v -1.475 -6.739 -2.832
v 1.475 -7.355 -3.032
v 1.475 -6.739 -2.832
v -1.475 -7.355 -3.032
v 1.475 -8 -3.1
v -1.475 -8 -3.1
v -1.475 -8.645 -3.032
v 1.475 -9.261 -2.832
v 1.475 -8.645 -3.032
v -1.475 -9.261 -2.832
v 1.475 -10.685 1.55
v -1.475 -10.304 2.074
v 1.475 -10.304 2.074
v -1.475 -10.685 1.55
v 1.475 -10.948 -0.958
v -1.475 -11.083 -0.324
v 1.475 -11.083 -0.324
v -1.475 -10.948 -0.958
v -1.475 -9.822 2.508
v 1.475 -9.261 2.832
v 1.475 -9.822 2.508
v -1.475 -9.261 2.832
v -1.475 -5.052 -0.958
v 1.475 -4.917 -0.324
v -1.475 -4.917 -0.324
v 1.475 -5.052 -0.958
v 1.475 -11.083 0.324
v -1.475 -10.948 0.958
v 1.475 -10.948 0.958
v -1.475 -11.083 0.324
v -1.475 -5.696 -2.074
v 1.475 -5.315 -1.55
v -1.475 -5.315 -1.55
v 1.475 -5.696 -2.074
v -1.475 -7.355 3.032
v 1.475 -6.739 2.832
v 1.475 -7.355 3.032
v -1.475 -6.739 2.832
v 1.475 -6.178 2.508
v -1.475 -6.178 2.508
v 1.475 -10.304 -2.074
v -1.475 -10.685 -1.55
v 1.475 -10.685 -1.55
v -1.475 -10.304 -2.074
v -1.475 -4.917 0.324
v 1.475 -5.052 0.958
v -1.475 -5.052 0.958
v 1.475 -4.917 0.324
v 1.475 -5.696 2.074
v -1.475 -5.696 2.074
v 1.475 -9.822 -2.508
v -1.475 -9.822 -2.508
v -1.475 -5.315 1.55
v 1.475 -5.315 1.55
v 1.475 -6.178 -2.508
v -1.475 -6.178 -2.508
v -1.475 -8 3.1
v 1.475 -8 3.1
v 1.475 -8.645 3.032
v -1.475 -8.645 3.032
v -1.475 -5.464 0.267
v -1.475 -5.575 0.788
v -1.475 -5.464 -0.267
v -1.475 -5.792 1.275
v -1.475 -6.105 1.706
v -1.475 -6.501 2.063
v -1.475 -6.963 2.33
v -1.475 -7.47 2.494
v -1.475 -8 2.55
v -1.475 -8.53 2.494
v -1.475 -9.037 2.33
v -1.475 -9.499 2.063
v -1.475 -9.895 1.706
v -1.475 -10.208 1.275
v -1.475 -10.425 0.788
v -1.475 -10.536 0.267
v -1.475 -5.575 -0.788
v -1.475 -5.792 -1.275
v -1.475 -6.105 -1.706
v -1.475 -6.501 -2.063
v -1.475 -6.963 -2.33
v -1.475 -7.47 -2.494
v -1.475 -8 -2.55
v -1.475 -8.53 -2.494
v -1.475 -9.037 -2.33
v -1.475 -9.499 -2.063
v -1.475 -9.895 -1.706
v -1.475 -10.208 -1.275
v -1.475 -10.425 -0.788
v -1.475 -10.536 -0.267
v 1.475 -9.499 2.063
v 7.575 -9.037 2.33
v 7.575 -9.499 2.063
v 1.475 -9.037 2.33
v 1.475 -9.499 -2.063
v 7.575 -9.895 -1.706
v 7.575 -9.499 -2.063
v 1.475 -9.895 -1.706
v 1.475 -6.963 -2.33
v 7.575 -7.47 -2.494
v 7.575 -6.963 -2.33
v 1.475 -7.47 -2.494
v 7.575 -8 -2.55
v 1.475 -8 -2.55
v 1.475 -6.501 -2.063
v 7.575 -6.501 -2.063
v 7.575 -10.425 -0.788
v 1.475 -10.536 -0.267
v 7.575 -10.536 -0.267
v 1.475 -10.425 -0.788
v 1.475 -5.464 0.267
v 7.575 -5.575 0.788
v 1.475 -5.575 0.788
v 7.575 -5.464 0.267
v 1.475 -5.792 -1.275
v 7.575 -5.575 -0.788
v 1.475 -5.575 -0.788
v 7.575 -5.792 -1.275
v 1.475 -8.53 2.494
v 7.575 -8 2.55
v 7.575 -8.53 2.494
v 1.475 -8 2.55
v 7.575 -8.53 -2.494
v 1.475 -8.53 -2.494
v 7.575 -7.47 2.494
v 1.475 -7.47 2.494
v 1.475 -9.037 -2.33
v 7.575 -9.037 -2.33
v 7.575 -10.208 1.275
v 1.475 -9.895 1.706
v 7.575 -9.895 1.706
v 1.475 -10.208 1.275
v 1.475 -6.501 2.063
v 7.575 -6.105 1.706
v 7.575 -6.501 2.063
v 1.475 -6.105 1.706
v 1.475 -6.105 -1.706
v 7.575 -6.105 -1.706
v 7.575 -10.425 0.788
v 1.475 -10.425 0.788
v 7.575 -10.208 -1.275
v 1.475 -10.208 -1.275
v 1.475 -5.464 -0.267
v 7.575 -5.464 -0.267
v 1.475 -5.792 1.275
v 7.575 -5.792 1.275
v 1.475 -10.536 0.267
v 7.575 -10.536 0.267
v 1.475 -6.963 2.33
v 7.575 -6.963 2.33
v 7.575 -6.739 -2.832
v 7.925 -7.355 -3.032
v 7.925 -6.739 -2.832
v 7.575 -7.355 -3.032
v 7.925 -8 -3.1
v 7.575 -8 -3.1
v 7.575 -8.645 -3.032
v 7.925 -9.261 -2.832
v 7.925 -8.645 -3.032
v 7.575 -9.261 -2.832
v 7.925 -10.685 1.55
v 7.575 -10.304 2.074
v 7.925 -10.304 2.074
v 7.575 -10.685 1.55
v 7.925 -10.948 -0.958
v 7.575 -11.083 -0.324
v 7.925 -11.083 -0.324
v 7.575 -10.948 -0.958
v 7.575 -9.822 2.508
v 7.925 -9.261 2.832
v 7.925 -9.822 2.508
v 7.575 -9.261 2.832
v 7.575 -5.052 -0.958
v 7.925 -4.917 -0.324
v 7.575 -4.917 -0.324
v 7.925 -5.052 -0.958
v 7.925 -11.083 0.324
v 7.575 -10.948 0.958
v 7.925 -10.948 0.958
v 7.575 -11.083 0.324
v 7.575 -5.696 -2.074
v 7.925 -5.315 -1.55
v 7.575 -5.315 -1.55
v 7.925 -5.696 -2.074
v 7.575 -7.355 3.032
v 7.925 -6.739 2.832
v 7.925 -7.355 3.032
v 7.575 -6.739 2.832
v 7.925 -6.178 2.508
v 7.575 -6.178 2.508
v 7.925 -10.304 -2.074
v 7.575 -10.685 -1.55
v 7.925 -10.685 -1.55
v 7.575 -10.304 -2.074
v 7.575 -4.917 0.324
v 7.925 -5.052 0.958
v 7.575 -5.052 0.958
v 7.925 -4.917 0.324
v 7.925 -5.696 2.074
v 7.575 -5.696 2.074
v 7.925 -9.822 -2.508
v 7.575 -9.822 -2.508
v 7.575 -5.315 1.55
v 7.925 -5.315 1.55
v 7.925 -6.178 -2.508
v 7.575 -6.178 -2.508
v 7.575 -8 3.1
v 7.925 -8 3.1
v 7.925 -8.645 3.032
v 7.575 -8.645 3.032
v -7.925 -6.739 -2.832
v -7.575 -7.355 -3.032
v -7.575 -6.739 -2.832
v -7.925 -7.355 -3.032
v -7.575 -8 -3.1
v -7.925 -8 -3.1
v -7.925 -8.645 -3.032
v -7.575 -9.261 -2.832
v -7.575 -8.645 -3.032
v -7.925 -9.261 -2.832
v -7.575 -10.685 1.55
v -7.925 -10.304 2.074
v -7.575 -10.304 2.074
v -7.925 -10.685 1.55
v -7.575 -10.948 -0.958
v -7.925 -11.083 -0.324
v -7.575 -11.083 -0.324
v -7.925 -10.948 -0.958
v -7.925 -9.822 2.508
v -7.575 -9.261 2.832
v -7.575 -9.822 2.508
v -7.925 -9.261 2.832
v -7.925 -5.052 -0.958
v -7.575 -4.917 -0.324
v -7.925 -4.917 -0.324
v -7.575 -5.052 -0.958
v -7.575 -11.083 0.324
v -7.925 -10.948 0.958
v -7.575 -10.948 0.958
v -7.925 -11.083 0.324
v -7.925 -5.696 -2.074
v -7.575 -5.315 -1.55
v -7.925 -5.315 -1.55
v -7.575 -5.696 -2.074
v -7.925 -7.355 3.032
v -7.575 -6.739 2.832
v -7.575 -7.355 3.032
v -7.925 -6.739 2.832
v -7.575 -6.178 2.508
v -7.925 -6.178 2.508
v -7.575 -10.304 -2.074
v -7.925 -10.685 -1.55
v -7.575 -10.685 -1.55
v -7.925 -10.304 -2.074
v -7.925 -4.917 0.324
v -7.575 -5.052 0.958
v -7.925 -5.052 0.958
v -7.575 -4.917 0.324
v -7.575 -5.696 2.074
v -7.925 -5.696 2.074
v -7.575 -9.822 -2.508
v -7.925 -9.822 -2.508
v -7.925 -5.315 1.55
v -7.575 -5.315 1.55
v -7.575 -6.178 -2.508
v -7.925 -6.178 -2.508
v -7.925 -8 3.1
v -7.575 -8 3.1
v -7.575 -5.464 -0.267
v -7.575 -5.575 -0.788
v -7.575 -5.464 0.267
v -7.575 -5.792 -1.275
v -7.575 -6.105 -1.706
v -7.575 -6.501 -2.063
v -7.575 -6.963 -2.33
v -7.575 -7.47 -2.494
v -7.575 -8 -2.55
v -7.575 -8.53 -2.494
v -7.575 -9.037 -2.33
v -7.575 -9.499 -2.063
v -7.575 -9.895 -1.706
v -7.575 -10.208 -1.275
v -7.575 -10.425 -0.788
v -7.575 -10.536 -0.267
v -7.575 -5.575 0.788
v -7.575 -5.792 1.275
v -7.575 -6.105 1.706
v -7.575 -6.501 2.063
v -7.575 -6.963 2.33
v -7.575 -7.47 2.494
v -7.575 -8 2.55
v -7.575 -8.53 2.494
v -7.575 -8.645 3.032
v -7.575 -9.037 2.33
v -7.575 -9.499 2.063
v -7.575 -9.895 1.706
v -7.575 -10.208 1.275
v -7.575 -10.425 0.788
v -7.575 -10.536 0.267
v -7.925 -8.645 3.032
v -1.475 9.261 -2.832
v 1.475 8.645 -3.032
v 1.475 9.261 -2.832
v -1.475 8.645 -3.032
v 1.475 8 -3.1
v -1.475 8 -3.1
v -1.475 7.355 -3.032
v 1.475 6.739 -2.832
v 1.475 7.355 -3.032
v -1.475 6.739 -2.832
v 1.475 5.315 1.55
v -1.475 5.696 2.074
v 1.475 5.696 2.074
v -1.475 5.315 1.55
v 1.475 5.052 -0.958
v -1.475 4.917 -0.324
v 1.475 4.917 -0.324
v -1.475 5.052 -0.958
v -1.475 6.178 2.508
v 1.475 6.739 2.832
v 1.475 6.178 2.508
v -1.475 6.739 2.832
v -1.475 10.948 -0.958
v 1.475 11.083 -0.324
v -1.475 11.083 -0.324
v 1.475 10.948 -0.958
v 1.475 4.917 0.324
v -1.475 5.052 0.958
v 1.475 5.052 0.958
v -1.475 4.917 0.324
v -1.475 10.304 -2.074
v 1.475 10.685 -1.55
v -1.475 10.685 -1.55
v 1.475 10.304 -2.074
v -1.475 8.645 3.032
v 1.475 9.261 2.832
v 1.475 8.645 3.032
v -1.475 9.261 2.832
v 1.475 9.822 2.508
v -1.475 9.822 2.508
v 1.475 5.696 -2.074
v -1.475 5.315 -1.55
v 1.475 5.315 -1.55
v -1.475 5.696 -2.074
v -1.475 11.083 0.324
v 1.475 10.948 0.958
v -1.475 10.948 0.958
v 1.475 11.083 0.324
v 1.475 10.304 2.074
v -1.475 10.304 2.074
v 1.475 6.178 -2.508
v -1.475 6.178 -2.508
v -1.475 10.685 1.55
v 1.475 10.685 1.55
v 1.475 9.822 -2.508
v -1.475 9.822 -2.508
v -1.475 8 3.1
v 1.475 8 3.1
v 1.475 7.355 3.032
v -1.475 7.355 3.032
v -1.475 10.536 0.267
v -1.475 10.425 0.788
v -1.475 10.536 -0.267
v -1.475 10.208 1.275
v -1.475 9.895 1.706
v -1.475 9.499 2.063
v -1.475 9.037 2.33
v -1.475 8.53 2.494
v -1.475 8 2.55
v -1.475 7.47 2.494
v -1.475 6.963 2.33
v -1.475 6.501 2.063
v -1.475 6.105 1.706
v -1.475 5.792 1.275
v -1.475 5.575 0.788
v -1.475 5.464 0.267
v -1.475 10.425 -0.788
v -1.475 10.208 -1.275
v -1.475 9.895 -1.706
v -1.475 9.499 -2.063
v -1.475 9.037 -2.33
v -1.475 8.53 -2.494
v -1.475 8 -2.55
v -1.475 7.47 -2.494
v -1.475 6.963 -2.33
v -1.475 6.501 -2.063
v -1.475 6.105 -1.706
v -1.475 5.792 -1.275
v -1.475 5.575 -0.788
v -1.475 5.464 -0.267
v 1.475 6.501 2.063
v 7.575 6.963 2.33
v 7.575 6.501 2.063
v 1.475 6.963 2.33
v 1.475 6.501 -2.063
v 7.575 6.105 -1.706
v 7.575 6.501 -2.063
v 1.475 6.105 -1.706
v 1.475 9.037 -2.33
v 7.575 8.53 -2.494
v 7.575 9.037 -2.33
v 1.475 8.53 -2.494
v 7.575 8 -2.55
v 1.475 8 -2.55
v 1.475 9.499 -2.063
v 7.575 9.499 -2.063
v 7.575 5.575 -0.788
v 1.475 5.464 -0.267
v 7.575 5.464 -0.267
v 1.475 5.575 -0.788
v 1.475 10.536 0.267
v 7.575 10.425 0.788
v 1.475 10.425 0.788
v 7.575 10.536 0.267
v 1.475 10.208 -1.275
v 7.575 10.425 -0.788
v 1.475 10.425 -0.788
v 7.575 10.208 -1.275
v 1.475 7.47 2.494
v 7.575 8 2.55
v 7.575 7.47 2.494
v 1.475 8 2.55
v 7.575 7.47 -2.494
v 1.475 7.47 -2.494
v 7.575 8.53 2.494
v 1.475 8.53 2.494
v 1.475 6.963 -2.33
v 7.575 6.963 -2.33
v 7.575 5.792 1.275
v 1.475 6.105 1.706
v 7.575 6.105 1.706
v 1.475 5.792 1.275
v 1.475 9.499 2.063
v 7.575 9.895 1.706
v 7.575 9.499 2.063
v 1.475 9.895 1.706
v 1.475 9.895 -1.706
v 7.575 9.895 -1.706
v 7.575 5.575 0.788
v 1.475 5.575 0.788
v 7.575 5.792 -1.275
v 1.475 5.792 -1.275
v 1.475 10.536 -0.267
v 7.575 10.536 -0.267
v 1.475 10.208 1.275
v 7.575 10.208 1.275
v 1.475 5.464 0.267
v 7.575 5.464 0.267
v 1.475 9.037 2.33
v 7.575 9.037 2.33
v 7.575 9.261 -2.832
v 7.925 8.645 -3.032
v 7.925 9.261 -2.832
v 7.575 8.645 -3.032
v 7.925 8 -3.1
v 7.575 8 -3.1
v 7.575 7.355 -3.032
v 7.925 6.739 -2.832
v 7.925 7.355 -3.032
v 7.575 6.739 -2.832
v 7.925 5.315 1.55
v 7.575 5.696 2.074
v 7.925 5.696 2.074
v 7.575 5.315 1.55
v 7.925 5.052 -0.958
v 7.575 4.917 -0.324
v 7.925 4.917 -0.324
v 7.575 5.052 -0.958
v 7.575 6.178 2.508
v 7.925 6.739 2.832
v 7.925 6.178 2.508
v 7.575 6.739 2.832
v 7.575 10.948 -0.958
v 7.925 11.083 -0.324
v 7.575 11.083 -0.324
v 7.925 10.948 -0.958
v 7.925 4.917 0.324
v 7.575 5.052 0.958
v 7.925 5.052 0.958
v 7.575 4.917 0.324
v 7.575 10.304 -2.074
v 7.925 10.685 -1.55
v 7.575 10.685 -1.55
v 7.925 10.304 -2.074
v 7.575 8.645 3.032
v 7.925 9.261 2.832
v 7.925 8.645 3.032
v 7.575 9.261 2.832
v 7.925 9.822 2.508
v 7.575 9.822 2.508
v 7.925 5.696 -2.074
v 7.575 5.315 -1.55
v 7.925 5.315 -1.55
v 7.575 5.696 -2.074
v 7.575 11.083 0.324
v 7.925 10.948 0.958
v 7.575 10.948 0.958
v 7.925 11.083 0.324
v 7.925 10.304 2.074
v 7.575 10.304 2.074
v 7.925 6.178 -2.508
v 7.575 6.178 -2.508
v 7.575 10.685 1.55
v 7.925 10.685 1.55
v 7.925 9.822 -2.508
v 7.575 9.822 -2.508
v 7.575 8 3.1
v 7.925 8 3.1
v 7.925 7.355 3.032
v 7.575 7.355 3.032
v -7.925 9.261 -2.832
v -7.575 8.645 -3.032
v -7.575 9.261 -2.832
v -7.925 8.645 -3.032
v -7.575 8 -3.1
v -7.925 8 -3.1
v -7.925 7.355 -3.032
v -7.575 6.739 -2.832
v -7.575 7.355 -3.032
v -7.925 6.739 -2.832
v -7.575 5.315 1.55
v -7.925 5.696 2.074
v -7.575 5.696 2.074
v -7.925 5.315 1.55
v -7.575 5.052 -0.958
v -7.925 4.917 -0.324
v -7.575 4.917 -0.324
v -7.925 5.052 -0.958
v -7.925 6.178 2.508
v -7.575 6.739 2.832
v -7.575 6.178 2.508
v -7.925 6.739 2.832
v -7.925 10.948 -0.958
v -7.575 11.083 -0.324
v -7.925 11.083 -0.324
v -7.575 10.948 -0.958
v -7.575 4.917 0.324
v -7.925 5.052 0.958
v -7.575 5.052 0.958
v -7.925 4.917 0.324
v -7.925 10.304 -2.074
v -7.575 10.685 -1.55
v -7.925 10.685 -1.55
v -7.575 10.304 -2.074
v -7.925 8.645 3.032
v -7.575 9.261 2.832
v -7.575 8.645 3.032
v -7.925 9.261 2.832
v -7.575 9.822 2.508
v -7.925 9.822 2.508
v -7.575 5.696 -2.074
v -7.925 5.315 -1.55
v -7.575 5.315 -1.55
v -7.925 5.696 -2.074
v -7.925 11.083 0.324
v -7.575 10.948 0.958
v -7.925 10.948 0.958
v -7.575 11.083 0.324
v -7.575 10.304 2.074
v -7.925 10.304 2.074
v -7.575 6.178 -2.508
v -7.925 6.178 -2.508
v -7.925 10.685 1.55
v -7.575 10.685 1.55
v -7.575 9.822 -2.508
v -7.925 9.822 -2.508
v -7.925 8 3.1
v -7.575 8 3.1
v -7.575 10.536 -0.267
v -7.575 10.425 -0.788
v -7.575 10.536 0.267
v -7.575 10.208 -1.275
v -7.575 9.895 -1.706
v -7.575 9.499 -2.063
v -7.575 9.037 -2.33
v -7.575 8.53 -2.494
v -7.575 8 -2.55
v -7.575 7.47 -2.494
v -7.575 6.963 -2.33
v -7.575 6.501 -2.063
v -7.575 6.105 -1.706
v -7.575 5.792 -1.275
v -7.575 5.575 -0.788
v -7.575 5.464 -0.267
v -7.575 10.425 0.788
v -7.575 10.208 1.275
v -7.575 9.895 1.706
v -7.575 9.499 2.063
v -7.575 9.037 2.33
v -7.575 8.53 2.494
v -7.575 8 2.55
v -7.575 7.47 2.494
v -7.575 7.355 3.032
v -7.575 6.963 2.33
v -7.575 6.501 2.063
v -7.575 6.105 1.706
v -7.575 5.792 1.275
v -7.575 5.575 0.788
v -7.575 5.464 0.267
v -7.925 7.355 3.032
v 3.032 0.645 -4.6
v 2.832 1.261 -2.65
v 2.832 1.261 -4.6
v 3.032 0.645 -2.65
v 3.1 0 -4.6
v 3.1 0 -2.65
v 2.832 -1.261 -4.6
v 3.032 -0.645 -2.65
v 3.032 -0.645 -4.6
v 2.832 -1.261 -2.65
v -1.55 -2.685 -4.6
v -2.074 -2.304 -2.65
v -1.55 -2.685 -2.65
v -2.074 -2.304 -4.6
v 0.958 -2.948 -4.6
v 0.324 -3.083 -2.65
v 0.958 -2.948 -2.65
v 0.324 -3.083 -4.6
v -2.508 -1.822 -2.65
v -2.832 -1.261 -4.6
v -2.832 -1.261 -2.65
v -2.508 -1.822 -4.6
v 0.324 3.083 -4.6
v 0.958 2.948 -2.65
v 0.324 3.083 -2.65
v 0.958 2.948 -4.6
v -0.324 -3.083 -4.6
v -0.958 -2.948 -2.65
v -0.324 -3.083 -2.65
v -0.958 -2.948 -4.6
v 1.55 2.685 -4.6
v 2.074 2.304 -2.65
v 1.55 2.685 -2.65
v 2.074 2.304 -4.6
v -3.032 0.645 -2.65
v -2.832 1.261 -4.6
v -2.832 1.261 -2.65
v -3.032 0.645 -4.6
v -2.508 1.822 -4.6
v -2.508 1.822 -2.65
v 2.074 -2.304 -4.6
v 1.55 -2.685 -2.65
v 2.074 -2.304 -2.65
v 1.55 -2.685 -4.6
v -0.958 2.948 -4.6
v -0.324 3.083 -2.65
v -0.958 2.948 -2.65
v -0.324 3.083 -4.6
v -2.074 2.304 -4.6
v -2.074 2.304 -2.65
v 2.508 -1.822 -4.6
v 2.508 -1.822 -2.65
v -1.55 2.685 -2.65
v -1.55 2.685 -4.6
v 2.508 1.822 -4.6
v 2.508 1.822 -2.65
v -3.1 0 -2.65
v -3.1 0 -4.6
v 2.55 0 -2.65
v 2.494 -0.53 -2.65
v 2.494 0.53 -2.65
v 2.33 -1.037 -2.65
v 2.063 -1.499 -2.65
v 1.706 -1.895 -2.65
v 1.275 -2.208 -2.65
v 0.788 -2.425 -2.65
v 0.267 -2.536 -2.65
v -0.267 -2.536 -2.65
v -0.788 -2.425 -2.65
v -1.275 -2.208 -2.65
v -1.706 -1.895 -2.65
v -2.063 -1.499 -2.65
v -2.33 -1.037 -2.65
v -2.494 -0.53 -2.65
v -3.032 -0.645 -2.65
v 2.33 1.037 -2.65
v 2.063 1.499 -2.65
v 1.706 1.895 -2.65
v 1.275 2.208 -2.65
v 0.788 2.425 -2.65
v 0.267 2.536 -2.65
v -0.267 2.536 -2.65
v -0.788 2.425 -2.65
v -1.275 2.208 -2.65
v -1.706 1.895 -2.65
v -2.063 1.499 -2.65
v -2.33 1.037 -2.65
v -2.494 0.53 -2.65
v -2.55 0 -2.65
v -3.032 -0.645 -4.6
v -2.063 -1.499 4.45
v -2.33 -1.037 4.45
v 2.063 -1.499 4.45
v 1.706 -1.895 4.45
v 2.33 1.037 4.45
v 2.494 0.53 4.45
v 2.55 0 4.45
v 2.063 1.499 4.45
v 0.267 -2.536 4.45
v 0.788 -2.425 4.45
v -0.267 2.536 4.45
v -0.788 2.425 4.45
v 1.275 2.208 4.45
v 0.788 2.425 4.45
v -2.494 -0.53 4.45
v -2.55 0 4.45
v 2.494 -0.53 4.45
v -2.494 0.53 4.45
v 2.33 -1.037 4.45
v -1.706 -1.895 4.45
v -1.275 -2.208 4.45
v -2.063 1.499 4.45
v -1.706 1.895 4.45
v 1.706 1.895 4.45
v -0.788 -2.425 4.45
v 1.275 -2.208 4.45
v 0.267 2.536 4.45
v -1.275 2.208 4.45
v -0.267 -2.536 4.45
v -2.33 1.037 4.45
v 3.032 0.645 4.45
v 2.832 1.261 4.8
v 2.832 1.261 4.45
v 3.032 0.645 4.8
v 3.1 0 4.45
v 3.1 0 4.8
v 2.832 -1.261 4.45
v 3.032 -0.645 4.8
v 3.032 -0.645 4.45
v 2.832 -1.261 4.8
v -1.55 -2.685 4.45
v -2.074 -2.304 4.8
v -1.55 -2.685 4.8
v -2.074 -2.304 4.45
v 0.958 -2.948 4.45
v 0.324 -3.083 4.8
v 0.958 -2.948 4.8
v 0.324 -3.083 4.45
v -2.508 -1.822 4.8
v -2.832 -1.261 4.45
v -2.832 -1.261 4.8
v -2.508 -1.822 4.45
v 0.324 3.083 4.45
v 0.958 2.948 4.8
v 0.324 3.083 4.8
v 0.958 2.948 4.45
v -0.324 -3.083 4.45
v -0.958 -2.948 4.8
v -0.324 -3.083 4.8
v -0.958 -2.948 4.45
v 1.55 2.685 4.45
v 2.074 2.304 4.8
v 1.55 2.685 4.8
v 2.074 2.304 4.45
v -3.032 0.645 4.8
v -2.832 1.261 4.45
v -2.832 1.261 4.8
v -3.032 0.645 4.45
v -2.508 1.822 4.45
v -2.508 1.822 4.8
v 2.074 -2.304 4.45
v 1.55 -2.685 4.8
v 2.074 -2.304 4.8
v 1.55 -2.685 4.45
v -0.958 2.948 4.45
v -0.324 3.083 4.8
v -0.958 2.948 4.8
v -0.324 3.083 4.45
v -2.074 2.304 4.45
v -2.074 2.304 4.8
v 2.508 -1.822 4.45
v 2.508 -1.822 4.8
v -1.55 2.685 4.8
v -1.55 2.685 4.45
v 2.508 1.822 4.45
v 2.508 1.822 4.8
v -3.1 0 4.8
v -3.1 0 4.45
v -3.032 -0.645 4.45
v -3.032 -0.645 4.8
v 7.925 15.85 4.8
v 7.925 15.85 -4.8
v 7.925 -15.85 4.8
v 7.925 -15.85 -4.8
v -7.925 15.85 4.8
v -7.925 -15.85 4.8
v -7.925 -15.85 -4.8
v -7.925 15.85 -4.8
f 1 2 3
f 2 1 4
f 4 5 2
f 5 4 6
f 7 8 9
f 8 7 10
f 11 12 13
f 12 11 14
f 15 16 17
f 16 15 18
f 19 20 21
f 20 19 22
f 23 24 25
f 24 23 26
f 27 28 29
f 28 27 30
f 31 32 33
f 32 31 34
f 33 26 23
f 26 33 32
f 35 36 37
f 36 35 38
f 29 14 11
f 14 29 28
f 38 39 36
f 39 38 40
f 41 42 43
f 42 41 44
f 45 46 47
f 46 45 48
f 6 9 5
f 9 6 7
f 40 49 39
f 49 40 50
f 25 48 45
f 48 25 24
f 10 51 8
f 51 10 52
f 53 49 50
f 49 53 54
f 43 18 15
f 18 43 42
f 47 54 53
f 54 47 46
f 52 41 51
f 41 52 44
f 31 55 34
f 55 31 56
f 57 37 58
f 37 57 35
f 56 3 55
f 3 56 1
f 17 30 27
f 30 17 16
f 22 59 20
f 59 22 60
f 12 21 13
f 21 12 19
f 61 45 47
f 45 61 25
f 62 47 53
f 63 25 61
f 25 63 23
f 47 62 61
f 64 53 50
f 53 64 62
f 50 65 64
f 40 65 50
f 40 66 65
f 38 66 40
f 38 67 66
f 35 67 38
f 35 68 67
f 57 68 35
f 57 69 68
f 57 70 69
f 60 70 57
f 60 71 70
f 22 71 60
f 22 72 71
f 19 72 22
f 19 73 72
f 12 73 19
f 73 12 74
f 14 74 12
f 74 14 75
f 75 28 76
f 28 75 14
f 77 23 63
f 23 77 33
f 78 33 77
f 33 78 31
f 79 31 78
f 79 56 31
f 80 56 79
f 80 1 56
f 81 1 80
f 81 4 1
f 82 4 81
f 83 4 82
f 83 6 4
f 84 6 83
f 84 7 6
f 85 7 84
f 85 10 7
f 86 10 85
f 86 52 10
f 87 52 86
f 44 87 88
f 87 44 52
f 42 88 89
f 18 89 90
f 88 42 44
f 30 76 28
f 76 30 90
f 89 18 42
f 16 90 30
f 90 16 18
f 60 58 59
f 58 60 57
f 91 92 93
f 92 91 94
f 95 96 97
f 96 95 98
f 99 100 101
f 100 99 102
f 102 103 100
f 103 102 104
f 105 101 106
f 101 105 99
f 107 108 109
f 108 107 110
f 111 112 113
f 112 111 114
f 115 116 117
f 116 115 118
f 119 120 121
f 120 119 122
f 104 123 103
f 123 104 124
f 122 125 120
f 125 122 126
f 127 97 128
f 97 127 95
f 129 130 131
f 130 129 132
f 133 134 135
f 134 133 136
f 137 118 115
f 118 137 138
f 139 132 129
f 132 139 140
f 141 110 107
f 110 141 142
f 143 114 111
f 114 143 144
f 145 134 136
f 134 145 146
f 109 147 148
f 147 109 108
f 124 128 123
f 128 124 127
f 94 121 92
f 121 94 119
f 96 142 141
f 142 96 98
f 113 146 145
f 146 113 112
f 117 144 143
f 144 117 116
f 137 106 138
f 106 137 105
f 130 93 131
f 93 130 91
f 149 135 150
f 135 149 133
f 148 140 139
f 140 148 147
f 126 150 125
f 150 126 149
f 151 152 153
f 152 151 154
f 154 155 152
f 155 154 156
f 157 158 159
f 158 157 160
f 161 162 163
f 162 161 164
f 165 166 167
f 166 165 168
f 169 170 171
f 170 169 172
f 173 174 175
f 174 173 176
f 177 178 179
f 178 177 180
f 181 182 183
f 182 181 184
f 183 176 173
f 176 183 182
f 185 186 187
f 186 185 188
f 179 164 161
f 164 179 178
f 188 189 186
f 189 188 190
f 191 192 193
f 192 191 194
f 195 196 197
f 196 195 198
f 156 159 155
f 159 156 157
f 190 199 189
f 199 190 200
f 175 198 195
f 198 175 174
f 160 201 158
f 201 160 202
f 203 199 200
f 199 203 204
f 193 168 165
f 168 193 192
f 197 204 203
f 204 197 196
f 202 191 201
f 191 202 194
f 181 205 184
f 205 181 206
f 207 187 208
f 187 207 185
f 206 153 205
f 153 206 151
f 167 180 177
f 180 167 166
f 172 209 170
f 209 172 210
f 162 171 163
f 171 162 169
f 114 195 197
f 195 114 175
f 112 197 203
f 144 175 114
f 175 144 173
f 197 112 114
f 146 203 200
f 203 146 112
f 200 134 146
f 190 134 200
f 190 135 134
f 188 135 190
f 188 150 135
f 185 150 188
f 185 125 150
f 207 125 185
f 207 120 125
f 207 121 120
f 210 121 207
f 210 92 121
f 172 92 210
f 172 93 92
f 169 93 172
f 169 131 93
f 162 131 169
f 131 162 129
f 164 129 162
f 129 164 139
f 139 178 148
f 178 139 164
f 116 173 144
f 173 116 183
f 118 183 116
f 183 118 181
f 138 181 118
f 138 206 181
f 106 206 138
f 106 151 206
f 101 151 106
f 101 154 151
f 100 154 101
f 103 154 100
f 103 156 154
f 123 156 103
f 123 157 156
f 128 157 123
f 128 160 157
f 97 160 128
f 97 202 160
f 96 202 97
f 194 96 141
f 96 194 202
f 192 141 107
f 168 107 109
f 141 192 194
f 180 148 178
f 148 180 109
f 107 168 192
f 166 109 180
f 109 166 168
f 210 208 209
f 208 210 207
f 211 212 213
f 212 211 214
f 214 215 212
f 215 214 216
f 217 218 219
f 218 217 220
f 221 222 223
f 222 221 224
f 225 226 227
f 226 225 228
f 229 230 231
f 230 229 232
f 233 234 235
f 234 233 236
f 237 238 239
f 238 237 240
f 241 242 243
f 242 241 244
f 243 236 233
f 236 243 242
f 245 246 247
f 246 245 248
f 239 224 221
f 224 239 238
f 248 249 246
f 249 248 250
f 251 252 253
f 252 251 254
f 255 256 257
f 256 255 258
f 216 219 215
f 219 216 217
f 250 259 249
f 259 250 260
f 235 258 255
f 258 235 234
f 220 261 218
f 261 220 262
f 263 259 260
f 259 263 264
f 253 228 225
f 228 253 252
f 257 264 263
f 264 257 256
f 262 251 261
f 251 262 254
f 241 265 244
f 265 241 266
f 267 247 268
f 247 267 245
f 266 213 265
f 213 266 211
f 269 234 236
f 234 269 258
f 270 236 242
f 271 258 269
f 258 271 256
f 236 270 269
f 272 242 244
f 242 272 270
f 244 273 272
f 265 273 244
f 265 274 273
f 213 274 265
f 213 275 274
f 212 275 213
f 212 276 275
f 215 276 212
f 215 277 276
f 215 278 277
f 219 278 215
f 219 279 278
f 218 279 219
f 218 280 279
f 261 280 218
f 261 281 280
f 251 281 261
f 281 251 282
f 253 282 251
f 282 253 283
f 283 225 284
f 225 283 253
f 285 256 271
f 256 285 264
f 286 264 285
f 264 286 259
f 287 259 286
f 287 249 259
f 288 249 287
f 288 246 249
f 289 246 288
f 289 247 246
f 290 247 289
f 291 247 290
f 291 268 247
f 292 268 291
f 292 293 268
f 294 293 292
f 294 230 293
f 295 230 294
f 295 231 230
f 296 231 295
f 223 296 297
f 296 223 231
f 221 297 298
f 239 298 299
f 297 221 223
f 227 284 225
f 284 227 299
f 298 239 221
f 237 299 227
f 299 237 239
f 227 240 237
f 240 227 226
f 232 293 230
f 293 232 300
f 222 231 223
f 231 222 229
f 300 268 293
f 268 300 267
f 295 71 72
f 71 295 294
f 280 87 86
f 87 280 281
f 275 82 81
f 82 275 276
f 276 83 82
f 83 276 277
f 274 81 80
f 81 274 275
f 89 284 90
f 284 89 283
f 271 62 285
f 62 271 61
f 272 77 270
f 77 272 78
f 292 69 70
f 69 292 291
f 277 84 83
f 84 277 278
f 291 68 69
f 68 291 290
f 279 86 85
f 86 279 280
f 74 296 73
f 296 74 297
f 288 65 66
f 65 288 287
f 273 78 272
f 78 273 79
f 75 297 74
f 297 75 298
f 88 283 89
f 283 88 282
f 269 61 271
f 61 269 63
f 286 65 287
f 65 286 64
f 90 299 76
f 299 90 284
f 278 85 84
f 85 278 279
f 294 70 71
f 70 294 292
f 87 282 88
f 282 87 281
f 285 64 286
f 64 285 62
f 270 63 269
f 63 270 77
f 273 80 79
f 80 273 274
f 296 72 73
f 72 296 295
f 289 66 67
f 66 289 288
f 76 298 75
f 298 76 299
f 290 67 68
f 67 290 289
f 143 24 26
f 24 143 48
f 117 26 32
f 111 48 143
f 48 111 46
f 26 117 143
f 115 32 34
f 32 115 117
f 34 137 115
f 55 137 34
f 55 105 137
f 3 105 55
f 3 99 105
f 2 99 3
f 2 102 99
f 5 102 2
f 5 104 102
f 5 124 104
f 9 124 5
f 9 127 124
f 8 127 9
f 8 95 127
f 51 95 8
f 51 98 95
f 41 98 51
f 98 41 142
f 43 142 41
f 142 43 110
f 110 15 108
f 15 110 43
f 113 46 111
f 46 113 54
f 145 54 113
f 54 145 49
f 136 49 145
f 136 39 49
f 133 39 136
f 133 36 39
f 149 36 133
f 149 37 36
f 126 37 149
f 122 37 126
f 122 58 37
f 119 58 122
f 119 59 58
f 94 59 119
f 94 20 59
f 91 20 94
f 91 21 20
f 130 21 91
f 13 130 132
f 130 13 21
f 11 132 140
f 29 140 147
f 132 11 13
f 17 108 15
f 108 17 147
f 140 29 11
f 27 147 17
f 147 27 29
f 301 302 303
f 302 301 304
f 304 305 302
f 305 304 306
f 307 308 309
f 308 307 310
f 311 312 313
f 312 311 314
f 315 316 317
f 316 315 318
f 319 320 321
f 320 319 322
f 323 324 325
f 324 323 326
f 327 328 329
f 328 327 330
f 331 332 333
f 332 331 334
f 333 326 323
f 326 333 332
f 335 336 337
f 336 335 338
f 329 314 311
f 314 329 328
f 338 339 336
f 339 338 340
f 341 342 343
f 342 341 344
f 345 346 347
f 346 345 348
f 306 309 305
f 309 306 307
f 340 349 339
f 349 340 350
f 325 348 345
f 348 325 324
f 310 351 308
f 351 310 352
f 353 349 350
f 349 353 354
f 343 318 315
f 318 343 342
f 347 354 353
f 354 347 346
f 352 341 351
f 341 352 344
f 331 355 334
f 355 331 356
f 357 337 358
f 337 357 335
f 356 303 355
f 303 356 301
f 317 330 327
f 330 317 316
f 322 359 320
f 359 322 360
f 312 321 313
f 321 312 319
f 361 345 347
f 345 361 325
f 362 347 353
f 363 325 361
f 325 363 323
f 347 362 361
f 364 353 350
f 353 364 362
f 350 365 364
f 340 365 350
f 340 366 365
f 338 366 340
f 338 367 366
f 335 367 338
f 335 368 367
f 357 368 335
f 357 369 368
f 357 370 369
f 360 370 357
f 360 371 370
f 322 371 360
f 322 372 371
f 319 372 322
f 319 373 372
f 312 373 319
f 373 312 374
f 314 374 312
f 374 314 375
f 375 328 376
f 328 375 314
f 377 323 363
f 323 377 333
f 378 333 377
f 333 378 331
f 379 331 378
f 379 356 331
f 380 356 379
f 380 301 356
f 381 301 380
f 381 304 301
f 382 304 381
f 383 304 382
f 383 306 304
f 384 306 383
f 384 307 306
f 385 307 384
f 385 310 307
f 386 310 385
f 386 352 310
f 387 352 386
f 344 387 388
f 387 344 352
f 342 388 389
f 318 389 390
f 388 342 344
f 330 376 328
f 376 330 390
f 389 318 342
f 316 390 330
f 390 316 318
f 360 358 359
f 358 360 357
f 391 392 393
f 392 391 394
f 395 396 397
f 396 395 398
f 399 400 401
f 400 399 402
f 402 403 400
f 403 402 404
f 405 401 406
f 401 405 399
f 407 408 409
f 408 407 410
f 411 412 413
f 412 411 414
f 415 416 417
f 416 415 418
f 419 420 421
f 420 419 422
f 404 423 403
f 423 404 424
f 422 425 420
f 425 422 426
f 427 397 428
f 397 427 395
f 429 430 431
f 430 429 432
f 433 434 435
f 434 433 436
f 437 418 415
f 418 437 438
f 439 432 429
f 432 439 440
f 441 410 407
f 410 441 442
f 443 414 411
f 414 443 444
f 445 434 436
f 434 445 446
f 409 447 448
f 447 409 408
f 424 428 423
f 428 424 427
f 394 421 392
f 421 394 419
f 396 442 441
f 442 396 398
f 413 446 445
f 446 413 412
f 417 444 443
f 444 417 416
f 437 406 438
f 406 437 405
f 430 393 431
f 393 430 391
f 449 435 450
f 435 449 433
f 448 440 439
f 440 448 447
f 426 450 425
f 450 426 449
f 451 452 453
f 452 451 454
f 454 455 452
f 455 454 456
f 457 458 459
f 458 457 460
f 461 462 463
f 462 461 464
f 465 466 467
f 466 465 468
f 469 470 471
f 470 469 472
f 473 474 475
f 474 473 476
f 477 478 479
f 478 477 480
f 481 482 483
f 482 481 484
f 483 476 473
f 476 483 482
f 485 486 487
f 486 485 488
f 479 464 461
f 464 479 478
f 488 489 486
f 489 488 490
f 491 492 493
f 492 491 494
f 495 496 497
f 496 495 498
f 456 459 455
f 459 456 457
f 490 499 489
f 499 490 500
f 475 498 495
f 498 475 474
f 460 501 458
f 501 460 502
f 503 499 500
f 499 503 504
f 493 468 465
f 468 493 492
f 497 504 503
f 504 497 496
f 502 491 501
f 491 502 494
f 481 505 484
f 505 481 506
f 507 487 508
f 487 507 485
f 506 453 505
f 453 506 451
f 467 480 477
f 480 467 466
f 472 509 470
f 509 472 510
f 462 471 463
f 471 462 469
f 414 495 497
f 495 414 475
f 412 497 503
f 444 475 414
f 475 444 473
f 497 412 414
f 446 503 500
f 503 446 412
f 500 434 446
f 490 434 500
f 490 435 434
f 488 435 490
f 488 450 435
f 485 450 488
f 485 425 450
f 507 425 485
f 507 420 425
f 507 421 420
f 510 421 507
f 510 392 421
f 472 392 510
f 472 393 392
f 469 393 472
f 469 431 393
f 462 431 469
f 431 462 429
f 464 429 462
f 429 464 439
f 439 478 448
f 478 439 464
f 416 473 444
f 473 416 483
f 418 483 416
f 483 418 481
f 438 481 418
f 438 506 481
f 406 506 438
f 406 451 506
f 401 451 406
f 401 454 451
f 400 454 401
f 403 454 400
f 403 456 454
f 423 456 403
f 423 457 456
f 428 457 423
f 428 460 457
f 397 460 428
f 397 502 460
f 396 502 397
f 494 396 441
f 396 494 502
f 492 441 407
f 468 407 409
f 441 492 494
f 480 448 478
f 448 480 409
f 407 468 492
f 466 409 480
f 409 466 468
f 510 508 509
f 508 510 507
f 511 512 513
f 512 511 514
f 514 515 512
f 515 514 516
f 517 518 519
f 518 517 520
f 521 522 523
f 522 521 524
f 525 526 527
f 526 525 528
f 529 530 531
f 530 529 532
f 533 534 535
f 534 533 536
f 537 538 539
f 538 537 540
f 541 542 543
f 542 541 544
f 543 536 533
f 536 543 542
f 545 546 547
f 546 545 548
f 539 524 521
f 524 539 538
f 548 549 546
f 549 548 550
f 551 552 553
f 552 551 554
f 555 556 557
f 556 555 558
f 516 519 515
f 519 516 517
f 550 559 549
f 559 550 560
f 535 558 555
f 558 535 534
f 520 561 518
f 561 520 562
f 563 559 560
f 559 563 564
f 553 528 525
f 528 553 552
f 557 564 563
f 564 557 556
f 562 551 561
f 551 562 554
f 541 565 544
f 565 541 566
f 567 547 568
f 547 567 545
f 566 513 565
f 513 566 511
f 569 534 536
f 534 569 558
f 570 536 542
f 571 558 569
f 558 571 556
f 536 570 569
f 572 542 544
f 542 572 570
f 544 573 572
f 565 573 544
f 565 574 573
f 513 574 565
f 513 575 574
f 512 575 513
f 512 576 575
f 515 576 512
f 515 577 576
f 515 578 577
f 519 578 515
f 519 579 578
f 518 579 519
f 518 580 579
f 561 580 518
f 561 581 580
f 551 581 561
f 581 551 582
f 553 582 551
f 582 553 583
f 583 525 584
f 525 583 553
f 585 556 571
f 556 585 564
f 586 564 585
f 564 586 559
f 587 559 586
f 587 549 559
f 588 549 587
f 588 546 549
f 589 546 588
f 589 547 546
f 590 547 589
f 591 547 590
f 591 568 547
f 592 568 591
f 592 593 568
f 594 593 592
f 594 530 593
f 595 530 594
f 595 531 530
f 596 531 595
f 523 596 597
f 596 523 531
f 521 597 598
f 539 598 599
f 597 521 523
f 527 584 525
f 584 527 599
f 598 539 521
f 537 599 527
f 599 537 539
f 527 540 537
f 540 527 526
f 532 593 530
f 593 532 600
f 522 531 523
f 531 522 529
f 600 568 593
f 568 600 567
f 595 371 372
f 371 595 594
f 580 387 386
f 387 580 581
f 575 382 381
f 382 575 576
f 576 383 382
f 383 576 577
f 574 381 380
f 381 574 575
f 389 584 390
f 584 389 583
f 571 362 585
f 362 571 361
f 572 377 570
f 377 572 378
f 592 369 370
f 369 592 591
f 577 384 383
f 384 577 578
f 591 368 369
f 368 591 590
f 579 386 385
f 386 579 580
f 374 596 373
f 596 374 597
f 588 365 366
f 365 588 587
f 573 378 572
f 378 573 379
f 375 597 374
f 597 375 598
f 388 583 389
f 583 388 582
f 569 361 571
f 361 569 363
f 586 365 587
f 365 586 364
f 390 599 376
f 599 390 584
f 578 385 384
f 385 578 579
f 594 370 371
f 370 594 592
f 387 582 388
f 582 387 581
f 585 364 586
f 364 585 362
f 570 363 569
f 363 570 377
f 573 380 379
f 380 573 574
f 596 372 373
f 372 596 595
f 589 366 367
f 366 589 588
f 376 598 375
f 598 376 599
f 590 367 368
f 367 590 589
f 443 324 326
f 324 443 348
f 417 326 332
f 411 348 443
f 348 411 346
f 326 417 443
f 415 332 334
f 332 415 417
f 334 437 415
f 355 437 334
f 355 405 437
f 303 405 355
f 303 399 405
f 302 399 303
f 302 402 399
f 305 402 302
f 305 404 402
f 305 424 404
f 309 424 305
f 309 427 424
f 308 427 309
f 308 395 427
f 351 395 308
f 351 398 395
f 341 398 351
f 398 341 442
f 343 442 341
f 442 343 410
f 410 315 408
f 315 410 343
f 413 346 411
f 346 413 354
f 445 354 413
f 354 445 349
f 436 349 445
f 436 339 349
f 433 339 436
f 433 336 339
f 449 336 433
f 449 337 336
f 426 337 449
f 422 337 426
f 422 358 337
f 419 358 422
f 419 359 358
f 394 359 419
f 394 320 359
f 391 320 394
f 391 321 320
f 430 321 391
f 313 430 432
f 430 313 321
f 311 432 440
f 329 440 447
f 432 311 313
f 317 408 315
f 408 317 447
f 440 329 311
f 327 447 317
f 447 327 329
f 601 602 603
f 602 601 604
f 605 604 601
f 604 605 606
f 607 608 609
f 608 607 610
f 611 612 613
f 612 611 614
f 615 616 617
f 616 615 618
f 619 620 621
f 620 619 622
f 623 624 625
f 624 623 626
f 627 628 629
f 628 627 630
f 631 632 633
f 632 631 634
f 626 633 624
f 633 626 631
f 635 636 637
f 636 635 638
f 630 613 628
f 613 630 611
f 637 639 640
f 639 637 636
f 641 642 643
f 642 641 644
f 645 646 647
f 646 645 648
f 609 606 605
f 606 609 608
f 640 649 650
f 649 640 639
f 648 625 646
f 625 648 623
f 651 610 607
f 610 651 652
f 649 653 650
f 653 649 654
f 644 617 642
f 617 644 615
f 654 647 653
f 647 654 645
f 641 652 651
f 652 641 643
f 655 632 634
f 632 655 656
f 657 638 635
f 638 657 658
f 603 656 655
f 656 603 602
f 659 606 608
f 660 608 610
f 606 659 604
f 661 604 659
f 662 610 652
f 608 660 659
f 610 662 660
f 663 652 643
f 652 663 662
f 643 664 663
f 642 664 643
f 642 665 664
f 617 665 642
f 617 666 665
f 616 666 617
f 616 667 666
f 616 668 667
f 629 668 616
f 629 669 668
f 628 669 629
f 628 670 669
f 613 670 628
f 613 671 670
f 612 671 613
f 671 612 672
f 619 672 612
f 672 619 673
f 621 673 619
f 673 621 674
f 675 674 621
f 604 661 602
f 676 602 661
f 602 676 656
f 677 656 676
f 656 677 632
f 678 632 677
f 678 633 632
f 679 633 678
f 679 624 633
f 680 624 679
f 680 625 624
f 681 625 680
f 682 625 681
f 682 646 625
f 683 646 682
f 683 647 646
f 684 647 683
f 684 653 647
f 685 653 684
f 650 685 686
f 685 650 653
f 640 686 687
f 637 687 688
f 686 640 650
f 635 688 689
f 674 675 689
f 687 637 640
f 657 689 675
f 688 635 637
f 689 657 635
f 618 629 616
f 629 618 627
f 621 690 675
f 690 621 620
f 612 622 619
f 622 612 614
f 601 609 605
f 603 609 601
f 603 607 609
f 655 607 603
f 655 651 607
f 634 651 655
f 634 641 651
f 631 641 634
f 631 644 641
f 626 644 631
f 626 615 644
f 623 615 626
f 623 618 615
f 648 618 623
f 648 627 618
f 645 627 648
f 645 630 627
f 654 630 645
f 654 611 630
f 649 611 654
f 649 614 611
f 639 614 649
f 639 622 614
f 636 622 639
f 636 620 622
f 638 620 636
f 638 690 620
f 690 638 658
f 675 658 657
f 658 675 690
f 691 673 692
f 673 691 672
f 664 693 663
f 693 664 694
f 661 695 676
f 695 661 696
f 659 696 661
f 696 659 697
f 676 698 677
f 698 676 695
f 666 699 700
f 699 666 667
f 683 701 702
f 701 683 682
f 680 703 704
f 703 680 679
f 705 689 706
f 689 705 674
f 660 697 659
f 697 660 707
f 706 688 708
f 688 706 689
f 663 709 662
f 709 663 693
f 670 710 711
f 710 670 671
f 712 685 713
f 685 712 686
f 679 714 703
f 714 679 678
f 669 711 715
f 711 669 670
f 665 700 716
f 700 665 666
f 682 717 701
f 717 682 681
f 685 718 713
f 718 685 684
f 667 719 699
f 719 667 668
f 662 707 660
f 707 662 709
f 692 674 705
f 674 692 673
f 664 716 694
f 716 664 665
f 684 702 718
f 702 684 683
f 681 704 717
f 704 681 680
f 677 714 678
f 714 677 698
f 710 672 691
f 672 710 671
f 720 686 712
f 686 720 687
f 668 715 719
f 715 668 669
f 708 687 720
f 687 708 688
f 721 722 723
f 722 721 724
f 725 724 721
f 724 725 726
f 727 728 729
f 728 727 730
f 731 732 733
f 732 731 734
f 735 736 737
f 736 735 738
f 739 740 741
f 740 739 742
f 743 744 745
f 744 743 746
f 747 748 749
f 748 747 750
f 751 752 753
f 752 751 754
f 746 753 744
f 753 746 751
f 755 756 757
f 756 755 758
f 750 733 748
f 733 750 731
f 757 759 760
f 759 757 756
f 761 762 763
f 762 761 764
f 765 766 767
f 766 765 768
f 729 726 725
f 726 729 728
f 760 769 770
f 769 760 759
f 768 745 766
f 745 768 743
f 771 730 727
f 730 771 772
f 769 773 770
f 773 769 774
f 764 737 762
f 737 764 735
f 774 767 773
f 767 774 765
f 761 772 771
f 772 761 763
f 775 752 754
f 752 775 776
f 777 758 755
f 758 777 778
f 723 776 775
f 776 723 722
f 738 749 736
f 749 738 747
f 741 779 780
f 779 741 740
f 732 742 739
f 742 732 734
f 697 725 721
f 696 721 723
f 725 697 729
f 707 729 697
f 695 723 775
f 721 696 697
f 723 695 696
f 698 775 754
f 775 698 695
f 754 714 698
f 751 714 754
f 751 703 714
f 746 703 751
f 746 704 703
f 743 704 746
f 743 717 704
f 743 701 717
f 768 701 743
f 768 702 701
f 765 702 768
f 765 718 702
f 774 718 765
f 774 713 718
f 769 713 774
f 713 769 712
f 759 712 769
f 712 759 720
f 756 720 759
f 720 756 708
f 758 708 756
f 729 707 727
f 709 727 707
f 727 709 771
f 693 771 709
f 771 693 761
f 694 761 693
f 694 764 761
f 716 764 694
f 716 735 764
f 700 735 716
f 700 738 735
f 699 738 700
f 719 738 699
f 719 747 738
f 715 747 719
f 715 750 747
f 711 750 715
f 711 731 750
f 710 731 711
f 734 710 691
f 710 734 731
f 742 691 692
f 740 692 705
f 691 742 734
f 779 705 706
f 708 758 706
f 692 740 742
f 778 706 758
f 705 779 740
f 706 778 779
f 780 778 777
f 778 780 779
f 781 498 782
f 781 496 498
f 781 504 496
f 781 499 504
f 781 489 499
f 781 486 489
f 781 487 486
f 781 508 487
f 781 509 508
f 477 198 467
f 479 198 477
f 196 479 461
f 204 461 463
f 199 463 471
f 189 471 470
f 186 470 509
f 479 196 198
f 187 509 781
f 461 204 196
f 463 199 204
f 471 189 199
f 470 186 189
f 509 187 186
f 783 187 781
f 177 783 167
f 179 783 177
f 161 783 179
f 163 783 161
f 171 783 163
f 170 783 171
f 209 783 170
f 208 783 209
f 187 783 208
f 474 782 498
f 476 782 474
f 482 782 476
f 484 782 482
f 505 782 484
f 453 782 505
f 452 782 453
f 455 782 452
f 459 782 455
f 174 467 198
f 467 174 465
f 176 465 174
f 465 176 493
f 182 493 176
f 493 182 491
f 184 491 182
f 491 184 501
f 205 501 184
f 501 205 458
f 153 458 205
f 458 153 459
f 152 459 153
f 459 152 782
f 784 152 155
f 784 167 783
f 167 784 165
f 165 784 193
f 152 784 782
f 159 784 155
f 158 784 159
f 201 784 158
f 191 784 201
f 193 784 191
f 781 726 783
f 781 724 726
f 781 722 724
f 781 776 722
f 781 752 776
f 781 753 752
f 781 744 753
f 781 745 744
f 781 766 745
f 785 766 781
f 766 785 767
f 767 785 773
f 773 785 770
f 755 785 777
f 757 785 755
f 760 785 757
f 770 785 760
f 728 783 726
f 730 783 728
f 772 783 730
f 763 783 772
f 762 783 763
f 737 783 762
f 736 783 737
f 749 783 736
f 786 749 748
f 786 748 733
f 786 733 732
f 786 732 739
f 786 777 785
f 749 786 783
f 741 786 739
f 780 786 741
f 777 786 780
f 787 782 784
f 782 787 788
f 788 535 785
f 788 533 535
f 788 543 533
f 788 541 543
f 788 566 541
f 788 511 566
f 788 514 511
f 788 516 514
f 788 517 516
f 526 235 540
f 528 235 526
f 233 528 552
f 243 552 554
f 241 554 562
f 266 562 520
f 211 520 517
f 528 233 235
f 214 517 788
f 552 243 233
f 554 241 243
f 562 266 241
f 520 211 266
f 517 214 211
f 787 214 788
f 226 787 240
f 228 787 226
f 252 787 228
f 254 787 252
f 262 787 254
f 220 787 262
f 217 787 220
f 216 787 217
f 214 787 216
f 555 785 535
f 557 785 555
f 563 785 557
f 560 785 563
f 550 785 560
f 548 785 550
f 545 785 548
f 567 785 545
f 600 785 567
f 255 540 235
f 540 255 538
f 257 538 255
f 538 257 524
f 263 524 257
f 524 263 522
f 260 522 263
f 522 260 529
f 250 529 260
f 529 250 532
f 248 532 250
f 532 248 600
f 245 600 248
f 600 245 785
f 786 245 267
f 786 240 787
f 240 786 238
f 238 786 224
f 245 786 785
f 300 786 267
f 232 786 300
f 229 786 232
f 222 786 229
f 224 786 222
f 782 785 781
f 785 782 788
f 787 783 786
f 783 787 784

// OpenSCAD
$fn=30*1.0;

Radius1 = 5.1/2;
Radius2 = 6.2/2;//6.5/2;
Height = 7.8*1.0;
Depth = 0.85*1.0;
Width = 7.3*1.0; 

module technic_cutout()
{
    union()
    {
        translate([0,0,-(Height-Depth+0.1)/2]) cylinder(r=Radius2,h=Depth+0.1, center=true);
        cylinder(r=Radius1,h=Height+0.1, center=true);
        translate([0,0,(Height-Depth+0.1)/2]) cylinder(r=Radius2,h=Depth+0.1, center=true);
    }
}

module SwivelBlock()
{
    width = 31.8;
    length = 47.8;
    wall_thickness = 1.55;
    top_thickness = 2;
    grip_thickness = 2.1;
    center_thickness = 8.0;
    center_od = 10;
    grip_od = 6.5;
    grip_id = 4.9;
    grip_spacing = 8.0;
    module grip_circle()
    {
        difference()
        {
            cylinder(grip_thickness+top_thickness,grip_od/2,grip_od/2,center=true);
            cylinder(grip_thickness+top_thickness+0.1,grip_id/2,grip_id/2,center=true);
        }
    }
    difference(){
    union()
    {
        translate([0,0,Height/4]) cylinder(Height,center_od/2,center_od/2,center=true);
        difference()
        {
            cube([width,length,grip_thickness+top_thickness],center=true);
            translate([0,0,grip_thickness/2]) cube([width-2*wall_thickness,length-2*wall_thickness,grip_thickness],center=true);
        }
        for(i=[-2:2])
        {
            for(j=[-1:1])
            {
                translate([grip_spacing*j,grip_spacing*i,0]) grip_circle();
            }
        }
    }
    translate([0,0,1.9]) technic_cutout();
    }
}

module technic_cutout1()
{
    add=1;
    union()
    {
        translate([0,0,-add-(Height-Depth+0.1)/2]) cylinder(r=Radius2,h=Depth+0.1+add, center=true);
        cylinder(r=Radius1,h=Height+0.1, center=true);
        translate([0,0,add+(Height-Depth+0.1)/2]) cylinder(r=Radius2,h=Depth+0.1+add, center=true);
    }
}
//SwivelBlock();
module SwivelBlock1()
{
    blength=31.7;
    bwidth=blength/2;
    bthickness=9.6;
    spacing = 8;
    difference()
    {
        cube([bwidth,blength,bthickness],center=true);
        for(j=[-1,1])
        {
            translate([(bwidth-Height)/2,spacing*j,0]) rotate([0,90,0]) technic_cutout1();
            translate([-(bwidth-Height)/2,spacing*j,0]) rotate([0,90,0]) technic_cutout1();
        }
        translate([0,0,(bthickness-Height)/2]) technic_cutout1();
    }
}
SwivelBlock1();
